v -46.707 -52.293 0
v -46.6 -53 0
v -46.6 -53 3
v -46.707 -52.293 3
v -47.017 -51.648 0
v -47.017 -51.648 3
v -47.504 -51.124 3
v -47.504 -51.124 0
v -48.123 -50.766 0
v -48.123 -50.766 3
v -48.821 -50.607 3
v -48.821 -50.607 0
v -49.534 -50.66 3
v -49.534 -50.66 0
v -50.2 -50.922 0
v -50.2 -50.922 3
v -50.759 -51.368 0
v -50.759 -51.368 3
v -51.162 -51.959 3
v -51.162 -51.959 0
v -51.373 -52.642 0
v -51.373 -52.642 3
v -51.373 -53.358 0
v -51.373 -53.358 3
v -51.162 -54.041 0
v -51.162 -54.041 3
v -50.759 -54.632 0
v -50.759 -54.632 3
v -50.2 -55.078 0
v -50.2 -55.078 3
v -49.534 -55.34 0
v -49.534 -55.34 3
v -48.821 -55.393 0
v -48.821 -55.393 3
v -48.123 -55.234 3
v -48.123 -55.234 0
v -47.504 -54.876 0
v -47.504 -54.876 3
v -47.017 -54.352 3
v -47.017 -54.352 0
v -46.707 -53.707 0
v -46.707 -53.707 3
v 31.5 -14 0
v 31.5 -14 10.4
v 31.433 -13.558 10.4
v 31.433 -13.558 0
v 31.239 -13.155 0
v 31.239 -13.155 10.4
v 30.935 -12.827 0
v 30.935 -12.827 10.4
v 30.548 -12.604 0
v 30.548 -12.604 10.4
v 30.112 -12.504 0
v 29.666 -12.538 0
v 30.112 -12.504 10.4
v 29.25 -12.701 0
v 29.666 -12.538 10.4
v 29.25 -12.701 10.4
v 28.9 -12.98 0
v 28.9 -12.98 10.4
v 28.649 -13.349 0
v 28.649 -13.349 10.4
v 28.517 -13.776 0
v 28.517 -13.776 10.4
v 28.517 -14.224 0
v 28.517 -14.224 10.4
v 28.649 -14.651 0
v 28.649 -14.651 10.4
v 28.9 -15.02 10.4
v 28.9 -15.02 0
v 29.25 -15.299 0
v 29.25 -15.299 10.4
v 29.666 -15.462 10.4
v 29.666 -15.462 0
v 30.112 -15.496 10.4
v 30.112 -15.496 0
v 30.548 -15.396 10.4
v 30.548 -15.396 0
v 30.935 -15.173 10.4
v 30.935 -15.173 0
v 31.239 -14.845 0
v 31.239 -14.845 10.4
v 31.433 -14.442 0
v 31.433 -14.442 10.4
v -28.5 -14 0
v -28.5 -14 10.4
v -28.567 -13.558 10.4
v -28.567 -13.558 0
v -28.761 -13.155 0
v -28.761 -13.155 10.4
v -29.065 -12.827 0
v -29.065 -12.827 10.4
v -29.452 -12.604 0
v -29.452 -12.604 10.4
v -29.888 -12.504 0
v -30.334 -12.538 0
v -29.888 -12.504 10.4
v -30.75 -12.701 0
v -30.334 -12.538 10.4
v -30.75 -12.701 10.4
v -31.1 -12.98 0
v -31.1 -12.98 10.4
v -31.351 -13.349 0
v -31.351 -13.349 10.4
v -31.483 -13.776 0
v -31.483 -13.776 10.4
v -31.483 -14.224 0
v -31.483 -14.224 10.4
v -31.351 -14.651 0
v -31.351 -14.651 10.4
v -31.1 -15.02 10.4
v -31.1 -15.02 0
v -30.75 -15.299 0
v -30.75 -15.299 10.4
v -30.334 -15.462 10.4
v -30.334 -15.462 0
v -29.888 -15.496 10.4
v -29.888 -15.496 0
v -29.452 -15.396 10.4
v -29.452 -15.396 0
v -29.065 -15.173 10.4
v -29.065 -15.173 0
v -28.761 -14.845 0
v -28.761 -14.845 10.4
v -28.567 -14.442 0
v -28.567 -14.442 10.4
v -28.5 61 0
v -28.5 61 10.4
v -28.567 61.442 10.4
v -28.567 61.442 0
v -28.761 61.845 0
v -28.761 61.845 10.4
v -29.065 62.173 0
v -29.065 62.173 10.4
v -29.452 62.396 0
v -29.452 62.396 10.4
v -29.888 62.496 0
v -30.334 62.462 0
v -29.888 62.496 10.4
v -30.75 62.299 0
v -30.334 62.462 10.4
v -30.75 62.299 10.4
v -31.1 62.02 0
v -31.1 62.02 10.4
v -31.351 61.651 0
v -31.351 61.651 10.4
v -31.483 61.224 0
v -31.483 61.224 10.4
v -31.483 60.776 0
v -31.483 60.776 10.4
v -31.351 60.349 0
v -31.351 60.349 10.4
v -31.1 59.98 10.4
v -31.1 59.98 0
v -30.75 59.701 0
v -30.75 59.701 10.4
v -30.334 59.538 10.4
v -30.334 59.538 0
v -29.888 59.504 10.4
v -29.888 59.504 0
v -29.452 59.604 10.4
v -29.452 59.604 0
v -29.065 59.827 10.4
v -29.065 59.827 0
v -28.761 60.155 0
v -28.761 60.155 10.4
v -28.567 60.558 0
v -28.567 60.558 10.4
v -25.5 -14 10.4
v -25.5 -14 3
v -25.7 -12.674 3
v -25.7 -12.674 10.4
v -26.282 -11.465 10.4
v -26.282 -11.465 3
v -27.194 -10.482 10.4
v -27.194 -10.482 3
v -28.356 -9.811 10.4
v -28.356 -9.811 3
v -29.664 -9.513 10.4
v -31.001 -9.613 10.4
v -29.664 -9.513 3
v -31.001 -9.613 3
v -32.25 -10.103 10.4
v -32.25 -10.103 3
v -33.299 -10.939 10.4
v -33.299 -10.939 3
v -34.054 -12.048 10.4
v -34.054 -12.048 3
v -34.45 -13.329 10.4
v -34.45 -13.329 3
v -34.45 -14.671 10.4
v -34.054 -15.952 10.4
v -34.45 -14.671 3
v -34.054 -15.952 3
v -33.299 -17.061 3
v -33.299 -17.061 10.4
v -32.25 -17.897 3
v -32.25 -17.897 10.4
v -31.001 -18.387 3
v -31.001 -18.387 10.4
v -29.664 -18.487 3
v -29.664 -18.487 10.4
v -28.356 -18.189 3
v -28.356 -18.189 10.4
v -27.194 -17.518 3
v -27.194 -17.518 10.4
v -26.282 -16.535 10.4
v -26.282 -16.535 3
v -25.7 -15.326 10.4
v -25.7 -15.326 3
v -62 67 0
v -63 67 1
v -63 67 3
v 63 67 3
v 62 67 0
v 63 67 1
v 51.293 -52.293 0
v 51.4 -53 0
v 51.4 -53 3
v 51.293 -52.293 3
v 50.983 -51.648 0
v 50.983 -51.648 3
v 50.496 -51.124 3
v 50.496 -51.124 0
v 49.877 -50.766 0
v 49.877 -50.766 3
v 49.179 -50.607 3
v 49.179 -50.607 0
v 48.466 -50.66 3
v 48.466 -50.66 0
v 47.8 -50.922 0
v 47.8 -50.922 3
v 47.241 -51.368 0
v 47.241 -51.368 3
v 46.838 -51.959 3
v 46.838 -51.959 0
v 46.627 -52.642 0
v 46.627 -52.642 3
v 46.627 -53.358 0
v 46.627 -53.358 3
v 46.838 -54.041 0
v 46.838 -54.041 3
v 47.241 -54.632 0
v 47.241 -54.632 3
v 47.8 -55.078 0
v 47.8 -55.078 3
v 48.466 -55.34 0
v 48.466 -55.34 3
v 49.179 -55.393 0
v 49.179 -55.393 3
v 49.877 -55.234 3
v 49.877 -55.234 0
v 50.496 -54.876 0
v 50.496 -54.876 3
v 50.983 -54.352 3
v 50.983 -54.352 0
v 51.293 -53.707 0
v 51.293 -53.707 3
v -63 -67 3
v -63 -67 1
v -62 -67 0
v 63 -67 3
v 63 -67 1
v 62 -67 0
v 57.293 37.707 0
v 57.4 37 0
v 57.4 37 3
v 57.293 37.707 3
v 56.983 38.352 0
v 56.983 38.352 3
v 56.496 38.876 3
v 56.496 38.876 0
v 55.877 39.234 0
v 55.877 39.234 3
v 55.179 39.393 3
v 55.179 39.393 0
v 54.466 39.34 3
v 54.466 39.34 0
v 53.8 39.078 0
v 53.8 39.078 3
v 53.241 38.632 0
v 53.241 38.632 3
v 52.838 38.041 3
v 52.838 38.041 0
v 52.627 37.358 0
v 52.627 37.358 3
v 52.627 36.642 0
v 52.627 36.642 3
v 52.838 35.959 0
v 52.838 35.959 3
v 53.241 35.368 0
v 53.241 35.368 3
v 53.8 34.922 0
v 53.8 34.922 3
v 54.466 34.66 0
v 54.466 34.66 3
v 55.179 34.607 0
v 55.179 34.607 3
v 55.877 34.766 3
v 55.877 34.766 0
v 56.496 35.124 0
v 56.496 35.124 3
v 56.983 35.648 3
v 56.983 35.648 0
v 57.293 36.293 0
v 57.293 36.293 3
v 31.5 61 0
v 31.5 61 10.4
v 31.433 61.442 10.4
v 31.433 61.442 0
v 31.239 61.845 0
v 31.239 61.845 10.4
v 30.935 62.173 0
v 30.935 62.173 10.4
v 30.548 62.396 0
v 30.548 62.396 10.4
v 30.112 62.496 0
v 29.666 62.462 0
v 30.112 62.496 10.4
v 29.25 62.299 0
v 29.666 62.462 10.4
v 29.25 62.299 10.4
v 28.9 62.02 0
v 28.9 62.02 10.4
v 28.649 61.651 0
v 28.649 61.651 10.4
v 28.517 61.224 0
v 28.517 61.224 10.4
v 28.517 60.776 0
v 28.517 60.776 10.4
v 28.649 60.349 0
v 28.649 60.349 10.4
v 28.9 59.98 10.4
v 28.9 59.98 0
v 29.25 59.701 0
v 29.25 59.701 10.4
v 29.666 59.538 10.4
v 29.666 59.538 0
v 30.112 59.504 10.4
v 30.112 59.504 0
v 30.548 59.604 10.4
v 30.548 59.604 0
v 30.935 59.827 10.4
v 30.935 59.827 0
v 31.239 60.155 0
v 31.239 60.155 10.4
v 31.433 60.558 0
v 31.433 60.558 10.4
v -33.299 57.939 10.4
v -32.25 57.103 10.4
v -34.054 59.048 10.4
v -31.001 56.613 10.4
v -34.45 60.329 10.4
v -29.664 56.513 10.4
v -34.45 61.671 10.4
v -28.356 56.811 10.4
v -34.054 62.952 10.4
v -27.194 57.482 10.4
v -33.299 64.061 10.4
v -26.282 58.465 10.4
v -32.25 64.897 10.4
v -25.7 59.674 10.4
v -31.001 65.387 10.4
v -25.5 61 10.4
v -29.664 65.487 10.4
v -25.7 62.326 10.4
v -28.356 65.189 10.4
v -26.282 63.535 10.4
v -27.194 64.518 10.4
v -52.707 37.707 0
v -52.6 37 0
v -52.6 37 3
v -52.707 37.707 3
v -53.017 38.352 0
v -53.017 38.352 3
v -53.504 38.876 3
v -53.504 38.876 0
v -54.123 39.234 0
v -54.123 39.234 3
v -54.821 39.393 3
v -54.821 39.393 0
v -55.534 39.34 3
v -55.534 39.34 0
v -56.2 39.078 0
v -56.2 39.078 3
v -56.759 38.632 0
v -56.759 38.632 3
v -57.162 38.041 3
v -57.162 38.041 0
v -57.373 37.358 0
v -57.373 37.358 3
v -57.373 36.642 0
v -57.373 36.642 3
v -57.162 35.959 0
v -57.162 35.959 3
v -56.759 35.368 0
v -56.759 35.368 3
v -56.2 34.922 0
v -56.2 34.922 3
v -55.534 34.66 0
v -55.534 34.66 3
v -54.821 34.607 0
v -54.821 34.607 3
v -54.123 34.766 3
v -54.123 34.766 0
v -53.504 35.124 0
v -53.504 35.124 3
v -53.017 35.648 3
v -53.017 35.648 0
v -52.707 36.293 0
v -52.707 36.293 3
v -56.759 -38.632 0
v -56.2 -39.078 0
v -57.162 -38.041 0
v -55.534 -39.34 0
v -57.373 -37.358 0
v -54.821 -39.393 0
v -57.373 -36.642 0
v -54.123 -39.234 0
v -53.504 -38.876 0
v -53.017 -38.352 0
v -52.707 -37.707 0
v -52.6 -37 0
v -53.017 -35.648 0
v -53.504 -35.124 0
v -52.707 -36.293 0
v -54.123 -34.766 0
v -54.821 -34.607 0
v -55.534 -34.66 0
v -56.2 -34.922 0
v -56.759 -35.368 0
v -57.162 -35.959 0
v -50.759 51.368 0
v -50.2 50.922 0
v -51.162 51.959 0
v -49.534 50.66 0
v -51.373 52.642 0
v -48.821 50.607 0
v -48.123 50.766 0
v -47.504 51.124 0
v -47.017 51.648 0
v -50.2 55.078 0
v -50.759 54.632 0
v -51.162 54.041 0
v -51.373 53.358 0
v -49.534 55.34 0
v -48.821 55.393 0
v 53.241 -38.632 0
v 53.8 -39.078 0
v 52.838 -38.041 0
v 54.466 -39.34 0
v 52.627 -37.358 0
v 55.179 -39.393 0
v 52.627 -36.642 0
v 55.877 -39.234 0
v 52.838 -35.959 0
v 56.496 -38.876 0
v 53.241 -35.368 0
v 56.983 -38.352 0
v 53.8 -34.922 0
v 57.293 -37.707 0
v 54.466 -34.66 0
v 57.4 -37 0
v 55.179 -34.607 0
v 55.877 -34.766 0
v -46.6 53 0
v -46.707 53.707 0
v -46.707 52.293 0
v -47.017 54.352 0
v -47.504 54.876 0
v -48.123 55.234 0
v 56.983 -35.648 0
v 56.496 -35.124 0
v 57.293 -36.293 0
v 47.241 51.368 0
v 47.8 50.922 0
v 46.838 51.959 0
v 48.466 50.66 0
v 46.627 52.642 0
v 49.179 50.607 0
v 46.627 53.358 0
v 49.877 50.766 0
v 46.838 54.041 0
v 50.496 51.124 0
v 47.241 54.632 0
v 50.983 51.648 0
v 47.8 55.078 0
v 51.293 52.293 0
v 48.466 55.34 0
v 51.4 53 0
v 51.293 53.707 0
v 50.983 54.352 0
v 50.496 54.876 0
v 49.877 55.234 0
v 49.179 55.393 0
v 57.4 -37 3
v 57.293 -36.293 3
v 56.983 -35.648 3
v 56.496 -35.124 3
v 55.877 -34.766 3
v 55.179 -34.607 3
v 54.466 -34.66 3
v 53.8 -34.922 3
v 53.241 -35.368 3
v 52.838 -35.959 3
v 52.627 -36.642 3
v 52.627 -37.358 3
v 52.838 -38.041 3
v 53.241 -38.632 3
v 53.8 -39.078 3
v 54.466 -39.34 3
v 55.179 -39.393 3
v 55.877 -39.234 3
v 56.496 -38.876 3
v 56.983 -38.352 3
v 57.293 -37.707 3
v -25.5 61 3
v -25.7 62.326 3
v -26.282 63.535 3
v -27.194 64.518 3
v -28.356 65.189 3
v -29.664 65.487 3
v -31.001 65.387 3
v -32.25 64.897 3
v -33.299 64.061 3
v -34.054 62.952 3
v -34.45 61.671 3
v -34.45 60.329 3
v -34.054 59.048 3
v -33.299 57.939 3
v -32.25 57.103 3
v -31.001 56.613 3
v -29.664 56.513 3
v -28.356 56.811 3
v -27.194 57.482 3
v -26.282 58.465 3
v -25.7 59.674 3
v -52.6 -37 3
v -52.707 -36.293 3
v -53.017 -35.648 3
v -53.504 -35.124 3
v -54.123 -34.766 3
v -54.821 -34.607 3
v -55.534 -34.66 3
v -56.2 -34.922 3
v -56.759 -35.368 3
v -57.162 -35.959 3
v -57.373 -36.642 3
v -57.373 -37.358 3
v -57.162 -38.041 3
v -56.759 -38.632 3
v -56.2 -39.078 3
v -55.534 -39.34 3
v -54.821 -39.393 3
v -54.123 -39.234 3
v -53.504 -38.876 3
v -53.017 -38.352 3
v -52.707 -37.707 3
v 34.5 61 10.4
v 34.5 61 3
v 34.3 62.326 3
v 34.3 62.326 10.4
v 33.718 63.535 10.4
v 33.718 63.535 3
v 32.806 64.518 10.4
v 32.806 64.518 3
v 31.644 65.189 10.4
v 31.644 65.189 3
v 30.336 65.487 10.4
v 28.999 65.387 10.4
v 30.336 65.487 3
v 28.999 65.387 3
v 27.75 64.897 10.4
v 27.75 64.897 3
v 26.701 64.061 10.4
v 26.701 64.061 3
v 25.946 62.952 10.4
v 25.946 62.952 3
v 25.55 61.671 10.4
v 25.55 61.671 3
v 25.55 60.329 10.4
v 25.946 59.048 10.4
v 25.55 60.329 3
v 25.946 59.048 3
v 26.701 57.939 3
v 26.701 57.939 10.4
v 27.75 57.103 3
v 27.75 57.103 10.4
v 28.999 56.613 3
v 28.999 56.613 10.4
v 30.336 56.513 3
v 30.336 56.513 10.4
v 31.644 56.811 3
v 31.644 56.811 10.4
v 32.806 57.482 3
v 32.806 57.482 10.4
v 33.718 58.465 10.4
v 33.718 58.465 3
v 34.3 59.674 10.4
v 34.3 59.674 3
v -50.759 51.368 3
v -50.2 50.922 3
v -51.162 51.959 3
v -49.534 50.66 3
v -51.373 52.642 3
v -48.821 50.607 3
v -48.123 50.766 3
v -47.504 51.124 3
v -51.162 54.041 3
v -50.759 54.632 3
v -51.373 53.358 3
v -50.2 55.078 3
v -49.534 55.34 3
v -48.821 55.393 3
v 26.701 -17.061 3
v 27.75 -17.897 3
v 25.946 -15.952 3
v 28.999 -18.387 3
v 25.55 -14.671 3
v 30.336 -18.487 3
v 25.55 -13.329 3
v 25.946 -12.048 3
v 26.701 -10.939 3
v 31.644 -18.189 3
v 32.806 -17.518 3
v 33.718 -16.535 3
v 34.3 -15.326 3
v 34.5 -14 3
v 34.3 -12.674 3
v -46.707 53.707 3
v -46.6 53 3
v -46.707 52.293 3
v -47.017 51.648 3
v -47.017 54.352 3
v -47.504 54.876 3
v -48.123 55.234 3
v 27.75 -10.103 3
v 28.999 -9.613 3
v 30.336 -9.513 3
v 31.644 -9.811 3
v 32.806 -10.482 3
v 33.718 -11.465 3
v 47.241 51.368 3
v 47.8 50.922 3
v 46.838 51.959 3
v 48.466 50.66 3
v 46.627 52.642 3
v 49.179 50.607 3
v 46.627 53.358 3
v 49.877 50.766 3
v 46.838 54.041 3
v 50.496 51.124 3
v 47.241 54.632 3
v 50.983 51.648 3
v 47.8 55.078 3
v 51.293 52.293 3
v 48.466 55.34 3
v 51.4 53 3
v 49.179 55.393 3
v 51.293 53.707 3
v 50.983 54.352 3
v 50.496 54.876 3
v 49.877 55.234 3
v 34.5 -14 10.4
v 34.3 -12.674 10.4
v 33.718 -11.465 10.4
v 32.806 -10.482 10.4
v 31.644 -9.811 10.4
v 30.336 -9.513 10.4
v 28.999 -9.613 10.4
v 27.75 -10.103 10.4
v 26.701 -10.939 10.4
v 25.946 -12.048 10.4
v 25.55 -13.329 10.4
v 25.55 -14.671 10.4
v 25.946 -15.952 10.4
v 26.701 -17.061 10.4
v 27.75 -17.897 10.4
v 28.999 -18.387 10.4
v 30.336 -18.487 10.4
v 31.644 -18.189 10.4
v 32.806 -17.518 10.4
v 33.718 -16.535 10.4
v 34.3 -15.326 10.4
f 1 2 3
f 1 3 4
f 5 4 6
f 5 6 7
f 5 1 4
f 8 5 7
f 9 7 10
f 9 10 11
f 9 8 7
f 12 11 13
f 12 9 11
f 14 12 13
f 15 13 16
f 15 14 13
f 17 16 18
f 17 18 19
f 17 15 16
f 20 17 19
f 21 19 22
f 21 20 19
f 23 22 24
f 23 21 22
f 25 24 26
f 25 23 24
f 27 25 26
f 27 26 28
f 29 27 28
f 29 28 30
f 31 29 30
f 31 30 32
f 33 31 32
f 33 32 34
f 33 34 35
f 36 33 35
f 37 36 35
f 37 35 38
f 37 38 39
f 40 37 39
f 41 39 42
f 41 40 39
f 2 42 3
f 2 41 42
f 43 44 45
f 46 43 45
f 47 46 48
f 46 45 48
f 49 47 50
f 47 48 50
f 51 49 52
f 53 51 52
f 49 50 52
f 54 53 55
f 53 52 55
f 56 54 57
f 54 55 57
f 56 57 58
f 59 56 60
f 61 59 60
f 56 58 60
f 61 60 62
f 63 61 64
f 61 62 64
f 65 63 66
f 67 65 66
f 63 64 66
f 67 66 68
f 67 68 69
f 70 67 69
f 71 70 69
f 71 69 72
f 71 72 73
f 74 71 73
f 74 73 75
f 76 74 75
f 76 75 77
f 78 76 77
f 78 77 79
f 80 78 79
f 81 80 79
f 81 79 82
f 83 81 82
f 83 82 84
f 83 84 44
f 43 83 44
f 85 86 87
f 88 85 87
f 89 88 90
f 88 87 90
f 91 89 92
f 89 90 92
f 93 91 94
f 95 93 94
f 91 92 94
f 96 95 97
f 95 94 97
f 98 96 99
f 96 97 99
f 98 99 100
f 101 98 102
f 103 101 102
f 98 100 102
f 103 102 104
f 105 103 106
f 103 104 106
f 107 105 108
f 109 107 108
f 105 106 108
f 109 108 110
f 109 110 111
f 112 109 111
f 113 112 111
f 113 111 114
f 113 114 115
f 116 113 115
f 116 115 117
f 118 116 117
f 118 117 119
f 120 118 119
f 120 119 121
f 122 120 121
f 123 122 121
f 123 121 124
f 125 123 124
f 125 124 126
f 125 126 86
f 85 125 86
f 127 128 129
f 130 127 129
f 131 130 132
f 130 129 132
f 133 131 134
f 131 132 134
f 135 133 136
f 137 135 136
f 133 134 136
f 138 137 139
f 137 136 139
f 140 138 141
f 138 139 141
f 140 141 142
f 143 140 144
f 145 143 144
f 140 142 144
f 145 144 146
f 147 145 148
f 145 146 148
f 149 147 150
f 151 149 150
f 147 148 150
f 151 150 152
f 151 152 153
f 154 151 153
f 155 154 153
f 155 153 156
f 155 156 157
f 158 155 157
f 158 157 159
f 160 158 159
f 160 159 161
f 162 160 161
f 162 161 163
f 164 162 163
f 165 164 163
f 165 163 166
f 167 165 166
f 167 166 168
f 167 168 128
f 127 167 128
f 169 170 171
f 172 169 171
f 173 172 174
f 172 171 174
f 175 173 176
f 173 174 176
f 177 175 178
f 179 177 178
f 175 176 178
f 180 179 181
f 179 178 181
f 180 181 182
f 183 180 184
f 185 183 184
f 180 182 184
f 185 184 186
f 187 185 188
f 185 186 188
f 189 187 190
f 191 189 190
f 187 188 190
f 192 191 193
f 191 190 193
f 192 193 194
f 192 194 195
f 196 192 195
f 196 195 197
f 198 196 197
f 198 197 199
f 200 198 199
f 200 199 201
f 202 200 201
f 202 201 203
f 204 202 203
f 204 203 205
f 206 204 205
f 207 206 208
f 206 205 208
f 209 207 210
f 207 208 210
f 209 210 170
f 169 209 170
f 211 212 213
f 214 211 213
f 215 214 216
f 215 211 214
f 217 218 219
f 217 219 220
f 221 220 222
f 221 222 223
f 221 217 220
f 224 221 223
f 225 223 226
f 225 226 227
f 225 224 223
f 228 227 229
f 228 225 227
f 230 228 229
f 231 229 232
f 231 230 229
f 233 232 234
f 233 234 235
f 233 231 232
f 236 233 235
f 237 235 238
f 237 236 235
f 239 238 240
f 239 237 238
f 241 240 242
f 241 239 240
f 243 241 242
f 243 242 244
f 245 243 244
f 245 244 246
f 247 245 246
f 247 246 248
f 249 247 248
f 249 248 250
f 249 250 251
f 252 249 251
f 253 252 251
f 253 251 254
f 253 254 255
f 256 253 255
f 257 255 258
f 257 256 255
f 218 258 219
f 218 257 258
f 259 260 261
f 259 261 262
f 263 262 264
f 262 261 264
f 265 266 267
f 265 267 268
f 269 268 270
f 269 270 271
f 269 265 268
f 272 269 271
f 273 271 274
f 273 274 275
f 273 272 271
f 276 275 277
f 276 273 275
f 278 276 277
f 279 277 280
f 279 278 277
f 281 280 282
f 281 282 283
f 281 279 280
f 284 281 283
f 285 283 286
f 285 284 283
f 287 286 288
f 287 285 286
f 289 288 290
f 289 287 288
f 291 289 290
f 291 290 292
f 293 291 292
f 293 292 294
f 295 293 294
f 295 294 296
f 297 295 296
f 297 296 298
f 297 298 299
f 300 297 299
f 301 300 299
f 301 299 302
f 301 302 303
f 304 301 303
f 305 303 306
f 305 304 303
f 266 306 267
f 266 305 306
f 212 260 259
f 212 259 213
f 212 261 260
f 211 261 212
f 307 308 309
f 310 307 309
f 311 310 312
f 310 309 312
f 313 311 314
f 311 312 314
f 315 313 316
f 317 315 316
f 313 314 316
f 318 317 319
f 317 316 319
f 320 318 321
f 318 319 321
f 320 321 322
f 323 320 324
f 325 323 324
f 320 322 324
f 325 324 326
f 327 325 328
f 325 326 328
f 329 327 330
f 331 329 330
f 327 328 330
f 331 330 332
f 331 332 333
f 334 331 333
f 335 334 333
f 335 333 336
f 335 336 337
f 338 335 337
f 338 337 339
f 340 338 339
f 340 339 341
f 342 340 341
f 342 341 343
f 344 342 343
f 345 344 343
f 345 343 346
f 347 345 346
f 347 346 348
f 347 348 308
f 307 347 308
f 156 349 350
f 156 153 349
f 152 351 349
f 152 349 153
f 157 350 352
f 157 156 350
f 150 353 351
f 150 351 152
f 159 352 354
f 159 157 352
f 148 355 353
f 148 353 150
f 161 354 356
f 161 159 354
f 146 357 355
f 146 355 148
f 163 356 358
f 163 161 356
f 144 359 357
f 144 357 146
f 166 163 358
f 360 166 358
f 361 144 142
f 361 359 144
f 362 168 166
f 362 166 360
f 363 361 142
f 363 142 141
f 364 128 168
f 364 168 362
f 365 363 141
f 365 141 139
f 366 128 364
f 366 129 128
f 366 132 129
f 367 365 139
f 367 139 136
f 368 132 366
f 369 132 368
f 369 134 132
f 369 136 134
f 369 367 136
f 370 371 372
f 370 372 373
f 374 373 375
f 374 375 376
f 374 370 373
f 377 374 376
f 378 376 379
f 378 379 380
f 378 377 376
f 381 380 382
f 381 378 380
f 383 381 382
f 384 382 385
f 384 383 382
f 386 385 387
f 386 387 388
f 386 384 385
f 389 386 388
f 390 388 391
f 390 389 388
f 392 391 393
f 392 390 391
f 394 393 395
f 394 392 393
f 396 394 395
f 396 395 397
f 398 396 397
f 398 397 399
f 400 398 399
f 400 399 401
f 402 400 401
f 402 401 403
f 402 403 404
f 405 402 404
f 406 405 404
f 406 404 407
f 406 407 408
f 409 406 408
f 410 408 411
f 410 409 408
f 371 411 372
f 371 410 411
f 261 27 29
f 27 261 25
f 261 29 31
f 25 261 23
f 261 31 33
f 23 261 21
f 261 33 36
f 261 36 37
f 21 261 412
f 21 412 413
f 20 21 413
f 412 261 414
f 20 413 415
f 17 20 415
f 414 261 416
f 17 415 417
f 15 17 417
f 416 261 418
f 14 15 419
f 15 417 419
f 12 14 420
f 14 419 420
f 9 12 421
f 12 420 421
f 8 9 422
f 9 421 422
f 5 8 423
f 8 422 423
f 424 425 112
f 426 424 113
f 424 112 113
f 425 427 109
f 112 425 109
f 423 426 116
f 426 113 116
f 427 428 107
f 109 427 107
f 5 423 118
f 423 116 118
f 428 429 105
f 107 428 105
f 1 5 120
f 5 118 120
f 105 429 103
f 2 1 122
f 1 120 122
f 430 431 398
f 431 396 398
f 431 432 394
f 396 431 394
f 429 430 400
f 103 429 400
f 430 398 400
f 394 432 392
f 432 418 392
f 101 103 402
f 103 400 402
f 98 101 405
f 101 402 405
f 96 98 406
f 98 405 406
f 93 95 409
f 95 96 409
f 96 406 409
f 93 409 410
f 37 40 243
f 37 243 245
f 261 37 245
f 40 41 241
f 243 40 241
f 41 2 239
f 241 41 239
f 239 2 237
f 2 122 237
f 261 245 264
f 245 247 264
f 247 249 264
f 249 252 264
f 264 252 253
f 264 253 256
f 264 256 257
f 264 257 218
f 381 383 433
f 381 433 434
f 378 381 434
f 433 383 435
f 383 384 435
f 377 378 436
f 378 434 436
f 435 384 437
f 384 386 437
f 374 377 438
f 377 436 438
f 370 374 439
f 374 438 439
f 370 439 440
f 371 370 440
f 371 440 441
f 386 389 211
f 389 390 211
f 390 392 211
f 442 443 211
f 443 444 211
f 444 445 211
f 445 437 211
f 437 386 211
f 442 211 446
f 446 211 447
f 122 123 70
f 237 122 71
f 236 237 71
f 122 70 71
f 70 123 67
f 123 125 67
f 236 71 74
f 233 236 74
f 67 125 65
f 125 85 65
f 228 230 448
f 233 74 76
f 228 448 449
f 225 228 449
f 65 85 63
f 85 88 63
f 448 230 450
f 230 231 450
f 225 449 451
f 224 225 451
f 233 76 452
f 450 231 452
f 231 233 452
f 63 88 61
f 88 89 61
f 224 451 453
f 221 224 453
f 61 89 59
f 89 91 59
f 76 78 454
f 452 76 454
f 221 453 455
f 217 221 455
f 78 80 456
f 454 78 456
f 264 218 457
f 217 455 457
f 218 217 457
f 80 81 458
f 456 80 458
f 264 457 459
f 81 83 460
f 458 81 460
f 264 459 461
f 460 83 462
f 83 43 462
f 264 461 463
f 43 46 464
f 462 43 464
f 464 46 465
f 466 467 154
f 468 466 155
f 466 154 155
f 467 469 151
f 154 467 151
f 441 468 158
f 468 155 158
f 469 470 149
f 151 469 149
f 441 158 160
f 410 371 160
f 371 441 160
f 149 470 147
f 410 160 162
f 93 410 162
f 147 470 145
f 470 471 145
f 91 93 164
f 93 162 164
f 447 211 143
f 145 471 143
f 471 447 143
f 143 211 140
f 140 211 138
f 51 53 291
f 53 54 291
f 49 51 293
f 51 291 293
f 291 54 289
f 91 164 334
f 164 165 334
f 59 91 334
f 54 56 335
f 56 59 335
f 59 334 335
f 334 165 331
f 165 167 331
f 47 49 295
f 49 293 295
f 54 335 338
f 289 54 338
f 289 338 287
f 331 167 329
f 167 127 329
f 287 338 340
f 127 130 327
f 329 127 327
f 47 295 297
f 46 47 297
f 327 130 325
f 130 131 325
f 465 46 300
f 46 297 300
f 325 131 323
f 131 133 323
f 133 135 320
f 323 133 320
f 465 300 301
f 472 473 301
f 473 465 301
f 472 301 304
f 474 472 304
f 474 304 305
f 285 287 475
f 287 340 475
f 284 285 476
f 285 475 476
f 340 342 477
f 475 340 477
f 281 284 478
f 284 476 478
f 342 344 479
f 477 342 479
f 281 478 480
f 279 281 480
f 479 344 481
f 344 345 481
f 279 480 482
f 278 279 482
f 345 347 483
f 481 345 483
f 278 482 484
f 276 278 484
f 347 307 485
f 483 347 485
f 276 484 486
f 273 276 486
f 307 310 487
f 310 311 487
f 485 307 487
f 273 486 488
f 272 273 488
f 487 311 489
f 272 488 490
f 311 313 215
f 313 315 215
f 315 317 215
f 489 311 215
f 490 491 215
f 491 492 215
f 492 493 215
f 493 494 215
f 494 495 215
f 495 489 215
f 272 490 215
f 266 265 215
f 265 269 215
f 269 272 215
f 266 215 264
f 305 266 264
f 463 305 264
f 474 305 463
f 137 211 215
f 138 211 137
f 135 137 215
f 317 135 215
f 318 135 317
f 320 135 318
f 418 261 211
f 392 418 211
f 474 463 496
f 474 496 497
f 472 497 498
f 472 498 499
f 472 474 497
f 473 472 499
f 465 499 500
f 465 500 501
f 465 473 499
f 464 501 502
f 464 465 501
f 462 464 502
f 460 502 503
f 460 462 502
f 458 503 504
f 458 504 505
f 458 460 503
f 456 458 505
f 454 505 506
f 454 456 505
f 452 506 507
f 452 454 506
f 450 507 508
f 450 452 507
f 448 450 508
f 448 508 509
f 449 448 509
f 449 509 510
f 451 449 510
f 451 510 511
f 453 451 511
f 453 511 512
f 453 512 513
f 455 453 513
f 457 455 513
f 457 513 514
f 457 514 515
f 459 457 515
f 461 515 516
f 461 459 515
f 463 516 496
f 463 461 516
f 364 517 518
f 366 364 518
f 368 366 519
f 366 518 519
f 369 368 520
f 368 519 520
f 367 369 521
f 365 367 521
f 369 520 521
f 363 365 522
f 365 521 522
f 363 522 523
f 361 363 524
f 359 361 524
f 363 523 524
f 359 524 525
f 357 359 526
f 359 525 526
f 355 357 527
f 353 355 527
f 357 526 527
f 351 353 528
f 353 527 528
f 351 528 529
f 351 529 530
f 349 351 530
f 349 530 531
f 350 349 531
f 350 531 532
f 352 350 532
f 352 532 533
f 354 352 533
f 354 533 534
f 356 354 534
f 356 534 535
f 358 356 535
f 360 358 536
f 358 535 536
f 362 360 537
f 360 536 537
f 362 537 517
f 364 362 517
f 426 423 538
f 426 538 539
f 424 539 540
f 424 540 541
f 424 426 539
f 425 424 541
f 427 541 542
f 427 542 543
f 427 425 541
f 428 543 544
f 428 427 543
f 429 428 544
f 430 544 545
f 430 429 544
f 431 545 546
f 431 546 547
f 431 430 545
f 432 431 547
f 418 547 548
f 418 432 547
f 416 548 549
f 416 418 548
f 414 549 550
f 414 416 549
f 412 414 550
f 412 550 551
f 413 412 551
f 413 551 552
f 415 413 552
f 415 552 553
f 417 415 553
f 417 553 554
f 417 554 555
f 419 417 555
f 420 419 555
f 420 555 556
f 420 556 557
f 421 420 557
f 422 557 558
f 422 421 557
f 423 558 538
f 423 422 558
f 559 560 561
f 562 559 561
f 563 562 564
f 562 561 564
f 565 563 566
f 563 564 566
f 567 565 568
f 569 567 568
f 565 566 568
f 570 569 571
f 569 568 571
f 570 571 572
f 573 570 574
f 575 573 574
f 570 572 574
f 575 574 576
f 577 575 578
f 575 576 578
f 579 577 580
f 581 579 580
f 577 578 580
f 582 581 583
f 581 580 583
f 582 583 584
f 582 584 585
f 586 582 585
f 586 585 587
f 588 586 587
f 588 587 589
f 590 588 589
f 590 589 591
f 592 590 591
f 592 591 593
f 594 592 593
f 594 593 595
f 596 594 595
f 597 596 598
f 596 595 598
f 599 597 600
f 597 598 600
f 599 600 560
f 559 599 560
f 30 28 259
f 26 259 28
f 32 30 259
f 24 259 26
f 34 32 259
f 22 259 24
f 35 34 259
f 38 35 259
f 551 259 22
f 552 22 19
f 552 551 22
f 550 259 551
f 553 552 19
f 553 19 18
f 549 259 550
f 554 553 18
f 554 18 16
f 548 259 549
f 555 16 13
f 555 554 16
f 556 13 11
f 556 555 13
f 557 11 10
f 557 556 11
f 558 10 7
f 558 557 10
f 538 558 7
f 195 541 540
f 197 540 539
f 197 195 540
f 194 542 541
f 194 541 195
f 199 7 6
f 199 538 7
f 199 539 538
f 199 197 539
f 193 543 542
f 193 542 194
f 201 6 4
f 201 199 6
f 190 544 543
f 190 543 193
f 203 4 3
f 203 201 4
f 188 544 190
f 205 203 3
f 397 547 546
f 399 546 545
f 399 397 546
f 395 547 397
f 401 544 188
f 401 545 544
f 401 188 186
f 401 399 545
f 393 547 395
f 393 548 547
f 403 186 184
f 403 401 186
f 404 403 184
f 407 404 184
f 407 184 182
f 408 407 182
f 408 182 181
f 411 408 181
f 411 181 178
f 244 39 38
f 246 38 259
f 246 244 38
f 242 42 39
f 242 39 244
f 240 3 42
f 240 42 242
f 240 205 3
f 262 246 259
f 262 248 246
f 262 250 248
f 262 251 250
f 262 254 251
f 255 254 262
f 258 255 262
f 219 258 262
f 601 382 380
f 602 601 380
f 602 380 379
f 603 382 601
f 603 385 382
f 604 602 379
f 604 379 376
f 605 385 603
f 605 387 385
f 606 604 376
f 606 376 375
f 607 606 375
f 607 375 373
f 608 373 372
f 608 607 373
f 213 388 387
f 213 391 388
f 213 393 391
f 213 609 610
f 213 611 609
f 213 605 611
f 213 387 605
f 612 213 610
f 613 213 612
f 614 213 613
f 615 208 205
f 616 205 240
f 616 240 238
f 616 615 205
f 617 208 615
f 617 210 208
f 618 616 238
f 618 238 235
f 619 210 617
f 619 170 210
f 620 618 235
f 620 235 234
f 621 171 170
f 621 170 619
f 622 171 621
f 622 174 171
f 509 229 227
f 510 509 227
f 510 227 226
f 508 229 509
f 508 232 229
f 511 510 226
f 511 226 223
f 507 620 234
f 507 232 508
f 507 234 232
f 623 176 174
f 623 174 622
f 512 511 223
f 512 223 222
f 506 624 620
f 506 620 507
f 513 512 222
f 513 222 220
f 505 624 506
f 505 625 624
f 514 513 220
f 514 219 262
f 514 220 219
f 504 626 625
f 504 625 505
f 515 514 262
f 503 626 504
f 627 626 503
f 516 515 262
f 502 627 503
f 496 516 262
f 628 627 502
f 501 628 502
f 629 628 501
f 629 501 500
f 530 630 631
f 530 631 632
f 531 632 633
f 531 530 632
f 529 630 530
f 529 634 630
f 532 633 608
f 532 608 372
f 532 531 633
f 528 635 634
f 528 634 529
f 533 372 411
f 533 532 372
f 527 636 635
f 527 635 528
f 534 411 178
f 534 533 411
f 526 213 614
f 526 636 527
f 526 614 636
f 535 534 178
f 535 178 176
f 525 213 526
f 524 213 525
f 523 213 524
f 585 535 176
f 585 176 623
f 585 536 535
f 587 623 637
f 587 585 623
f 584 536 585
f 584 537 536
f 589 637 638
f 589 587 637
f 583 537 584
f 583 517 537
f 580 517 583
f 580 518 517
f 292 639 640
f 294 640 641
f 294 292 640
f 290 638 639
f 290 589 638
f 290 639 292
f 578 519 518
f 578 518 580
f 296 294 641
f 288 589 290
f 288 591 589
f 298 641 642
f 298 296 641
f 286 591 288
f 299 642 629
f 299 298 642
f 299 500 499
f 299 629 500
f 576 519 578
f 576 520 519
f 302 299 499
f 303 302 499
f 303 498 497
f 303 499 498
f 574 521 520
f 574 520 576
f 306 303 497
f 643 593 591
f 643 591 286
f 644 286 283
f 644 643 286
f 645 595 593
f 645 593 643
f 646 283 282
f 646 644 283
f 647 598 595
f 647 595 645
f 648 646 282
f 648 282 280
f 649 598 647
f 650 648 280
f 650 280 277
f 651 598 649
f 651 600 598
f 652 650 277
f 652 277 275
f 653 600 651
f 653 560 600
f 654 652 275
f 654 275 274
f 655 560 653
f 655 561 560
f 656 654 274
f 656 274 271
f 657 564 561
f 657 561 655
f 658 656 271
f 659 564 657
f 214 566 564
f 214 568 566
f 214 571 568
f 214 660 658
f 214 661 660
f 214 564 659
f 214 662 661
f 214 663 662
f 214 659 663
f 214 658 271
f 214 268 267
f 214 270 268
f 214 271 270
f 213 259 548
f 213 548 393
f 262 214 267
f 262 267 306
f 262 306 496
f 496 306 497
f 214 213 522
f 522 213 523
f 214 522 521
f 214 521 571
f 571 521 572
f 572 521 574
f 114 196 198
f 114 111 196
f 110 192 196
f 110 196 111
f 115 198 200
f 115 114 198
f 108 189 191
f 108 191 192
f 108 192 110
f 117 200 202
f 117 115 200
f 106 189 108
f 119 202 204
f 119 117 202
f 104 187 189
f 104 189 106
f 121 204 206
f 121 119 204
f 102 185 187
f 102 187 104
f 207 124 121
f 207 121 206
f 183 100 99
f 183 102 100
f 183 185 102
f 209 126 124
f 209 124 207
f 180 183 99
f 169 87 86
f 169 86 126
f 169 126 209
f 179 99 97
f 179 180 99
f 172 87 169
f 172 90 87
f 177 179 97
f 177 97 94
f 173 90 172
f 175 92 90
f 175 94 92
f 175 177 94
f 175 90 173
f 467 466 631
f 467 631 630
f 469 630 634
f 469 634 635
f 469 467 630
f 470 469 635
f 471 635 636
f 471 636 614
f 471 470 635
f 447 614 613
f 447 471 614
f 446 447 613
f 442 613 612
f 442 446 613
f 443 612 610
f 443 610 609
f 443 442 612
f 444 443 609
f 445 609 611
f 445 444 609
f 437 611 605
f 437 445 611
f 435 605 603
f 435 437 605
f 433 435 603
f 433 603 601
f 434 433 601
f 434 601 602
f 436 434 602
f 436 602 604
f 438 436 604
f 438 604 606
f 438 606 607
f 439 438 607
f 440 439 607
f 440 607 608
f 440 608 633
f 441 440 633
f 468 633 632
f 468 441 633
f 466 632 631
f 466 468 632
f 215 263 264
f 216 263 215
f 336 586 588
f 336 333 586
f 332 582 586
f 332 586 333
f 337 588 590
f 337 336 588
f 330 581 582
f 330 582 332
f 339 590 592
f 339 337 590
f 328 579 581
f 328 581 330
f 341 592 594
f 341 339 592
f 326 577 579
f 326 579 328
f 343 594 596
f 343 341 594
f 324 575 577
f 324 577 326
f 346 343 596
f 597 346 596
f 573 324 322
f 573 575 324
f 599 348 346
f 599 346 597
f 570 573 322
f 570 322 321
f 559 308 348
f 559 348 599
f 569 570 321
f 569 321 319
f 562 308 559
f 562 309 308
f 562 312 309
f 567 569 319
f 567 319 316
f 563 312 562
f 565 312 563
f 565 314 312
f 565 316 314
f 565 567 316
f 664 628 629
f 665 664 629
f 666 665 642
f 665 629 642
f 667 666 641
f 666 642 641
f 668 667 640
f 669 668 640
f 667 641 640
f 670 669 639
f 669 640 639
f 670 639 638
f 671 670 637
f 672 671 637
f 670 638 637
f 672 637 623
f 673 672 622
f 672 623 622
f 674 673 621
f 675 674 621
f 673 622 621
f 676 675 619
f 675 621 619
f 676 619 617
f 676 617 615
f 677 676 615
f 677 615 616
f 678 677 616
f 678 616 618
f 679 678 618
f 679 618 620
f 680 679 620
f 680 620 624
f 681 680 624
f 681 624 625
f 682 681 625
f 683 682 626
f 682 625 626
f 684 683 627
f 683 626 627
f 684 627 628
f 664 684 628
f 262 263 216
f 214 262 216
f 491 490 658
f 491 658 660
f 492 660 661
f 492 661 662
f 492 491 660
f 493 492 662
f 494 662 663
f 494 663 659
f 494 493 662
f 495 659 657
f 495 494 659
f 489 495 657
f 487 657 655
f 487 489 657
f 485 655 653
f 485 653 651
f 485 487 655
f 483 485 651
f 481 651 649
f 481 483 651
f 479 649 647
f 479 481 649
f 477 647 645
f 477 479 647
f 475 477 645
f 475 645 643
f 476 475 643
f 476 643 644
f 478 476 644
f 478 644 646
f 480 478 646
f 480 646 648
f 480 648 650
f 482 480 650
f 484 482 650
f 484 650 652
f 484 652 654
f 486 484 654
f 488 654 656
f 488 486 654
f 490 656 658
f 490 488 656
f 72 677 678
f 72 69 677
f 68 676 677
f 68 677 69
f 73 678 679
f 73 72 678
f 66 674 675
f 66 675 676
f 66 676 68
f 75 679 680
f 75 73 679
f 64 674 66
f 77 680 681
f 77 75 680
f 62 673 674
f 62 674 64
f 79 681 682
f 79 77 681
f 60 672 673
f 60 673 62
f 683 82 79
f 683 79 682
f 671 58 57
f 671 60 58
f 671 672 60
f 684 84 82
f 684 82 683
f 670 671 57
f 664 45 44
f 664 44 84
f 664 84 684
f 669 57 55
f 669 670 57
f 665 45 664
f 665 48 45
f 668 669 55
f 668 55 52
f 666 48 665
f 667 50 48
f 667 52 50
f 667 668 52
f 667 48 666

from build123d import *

# Parameters (mm, degrees)
SKETCH001_W     = 126
SKETCH001_H     = 134
SKETCH001_R     = 2.4
PAD_DEPTH       = 3
SKETCH009_R     = 4.5
PAD005_DEPTH    = 7.4
SKETCH010_R     = 1.5
POCKET017_DEPTH = 10.401
CHAMFER015_SIZE = 1


with BuildPart() as part:
    # Sketch001 → Pad (new body)
    with BuildSketch(Plane.XY):
        Rectangle(SKETCH001_W, SKETCH001_H)
        with Locations((-49, 53)):
            Circle(SKETCH001_R, mode=Mode.SUBTRACT)
        with Locations((49, 53)):
            Circle(SKETCH001_R, mode=Mode.SUBTRACT)
        with Locations((-49, -53)):
            Circle(SKETCH001_R, mode=Mode.SUBTRACT)
        with Locations((49, -53)):
            Circle(SKETCH001_R, mode=Mode.SUBTRACT)
        with Locations((55, 37)):
            Circle(SKETCH001_R, mode=Mode.SUBTRACT)
        with Locations((-55, 37)):
            Circle(SKETCH001_R, mode=Mode.SUBTRACT)
        with Locations((-55, -37)):
            Circle(SKETCH001_R, mode=Mode.SUBTRACT)
        with Locations((55, -37)):
            Circle(SKETCH001_R, mode=Mode.SUBTRACT)
    extrude(amount=PAD_DEPTH)

    # Sketch009 (on Face14 of Pad) → Pad005 (join)
    with BuildSketch(Plane.XY.offset(3)):
        with Locations((-30, 61)):
            Circle(SKETCH009_R)
        with Locations((30, 61)):
            Circle(SKETCH009_R)
        with Locations((-30, -14)):
            Circle(SKETCH009_R)
        with Locations((30, -14)):
            Circle(SKETCH009_R)
    extrude(amount=PAD005_DEPTH)

    # Sketch010 (on Face22 of Pad005) → Pocket017 (cut, through all)
    with BuildSketch(Plane.XY.offset(10.4)):
        with Locations((-30, 61)):
            Circle(SKETCH010_R)
        with Locations((30, 61)):
            Circle(SKETCH010_R)
        with Locations((30, -14)):
            Circle(SKETCH010_R)
        with Locations((-30, -14)):
            Circle(SKETCH010_R)
    extrude(amount=-POCKET017_DEPTH, mode=Mode.SUBTRACT)

    # Chamfer015
    chamfer015_edges = [part.edges().sort_by_distance(p)[0] for p in [
        (-63, 0, 0),
        (63, 0, 0),
    ]]
    chamfer(chamfer015_edges, length=CHAMFER015_SIZE)


solid = part.part
